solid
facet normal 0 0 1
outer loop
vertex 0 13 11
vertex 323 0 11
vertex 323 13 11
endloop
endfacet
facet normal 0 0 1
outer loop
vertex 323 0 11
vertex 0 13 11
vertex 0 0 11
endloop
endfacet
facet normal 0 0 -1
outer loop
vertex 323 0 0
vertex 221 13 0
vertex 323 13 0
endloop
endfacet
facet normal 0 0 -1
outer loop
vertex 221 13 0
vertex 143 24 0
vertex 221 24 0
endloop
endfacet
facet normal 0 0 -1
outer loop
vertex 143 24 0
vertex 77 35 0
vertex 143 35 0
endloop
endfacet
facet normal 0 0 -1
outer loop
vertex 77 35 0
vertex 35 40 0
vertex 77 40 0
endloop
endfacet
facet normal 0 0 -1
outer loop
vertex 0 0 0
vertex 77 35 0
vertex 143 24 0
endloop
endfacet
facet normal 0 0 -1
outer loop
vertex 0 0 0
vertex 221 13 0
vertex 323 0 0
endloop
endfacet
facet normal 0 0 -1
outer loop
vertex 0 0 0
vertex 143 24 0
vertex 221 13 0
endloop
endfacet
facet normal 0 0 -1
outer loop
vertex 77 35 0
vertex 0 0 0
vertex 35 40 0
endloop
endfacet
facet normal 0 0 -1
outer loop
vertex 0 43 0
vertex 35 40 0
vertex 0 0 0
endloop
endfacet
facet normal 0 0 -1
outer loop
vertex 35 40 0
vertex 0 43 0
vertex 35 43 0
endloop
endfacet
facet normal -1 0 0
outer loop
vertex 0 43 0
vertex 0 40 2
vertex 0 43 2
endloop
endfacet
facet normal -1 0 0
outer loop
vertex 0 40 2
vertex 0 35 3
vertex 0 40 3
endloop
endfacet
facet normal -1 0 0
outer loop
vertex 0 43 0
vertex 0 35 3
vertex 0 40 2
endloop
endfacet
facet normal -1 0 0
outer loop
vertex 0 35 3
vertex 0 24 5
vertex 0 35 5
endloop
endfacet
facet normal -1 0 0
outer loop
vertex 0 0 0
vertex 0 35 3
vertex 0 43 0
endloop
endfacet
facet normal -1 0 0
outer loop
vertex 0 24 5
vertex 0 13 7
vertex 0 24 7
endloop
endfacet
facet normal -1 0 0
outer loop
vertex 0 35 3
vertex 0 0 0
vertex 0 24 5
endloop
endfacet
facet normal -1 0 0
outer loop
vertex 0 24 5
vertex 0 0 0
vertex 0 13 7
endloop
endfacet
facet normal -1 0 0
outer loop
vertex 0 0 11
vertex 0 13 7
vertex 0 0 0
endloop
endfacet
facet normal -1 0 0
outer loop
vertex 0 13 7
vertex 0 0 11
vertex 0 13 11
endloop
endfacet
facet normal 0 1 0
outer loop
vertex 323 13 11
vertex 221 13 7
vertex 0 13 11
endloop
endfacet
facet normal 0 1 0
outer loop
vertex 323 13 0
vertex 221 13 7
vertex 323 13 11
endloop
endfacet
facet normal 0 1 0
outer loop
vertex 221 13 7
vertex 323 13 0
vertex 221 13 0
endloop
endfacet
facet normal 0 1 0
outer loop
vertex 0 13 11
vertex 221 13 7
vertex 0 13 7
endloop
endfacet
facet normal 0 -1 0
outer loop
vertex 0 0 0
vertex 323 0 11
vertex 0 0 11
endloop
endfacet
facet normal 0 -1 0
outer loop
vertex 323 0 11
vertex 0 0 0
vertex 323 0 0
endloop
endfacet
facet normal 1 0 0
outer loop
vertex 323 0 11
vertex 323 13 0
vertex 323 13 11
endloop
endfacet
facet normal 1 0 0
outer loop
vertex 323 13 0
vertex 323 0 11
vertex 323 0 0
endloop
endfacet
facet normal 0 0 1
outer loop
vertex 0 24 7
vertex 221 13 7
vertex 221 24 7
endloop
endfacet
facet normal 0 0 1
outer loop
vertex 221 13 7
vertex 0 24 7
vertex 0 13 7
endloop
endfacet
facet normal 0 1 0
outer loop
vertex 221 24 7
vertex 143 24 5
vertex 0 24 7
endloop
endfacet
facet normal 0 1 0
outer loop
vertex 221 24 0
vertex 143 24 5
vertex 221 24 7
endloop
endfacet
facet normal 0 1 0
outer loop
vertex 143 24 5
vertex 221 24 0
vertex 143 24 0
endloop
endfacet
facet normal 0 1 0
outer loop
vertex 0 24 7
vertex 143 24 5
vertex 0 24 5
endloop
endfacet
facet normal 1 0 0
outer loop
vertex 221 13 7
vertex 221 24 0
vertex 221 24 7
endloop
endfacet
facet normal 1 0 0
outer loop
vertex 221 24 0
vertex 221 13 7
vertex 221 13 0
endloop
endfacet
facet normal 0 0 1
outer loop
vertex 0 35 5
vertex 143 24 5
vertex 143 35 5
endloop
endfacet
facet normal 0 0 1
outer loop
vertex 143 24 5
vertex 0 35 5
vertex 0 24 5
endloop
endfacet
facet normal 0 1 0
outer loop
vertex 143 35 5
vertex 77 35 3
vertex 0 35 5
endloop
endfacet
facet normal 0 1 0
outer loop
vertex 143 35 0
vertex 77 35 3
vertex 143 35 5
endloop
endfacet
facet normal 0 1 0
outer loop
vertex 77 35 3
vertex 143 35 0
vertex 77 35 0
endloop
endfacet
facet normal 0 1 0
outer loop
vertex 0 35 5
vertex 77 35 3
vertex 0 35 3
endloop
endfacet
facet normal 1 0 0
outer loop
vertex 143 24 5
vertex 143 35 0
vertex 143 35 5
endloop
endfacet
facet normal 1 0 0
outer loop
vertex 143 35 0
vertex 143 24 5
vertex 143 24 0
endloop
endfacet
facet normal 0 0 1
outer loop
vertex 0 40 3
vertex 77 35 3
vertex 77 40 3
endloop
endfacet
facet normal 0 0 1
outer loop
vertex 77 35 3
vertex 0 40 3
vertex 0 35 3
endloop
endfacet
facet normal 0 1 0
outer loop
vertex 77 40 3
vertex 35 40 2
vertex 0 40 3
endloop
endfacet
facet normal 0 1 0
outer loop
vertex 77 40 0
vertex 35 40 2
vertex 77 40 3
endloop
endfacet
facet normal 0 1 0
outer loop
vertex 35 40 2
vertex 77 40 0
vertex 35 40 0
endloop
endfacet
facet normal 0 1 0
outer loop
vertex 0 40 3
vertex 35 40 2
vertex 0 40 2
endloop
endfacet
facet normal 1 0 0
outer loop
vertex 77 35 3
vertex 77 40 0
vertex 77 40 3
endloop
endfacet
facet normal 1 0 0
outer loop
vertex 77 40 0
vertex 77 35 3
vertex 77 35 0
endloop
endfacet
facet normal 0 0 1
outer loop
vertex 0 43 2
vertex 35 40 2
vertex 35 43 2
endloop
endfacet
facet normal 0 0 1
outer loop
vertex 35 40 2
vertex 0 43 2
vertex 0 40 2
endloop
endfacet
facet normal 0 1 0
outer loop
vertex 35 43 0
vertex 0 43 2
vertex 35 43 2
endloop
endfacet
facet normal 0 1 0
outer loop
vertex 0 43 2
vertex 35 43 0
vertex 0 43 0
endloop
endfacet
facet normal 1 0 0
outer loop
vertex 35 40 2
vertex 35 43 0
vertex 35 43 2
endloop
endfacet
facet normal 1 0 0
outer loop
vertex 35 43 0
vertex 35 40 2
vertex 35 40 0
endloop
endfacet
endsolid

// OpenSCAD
translate([8.5, 6.5, 5.5]) color([0.6315169232882821, 0.08649939658707362, 0.7550350740823142]) cube([17, 13, 11], center=true);
translate([25.5, 6.5, 5.5]) color([0.2947283238309857, 0.8301737658604361, 0.4490883769000732]) cube([17, 13, 11], center=true);
translate([42.5, 6.5, 5.5]) color([0.4620108455998946, 0.2187341846418389, 0.11445722556586746]) cube([17, 13, 11], center=true);
translate([59.5, 6.5, 5.5]) color([0.9788025142917065, 0.3011589686960586, 0.6091605287508749]) cube([17, 13, 11], center=true);
translate([76.5, 6.5, 5.5]) color([0.4242090709976407, 0.7513524999576429, 0.09255304692818778]) cube([17, 13, 11], center=true);
translate([93.5, 6.5, 5.5]) color([0.4976795968420046, 0.9609180855182016, 0.5437408220916614]) cube([17, 13, 11], center=true);
translate([110.5, 6.5, 5.5]) color([0.405305104554358, 0.6320656015278037, 0.0216193804206819]) cube([17, 13, 11], center=true);
translate([127.5, 6.5, 5.5]) color([0.2700784048715086, 0.6684886667173141, 0.0002532098932251925]) cube([17, 13, 11], center=true);
translate([144.5, 6.5, 5.5]) color([0.3984286079265319, 0.8905618085087551, 0.7099647178965433]) cube([17, 13, 11], center=true);
translate([161.5, 6.5, 5.5]) color([0.4445845492335537, 0.7465509493098265, 0.35382203223851694]) cube([17, 13, 11], center=true);
translate([178.5, 6.5, 5.5]) color([0.8712980207444939, 0.6725473918674463, 0.19603088941730495]) cube([17, 13, 11], center=true);
translate([195.5, 6.5, 5.5]) color([0.08525923665948931, 0.0704556688087915, 0.26248678792717994]) cube([17, 13, 11], center=true);
translate([212.5, 6.5, 5.5]) color([0.533638651221174, 0.11818482376773232, 0.8594532404023933]) cube([17, 13, 11], center=true);
translate([229.5, 6.5, 5.5]) color([0.8906989166138923, 0.7620005545284954, 0.06809296768032302]) cube([17, 13, 11], center=true);
translate([246.5, 6.5, 5.5]) color([0.8609410769469436, 0.2827478909480132, 0.13442052583382869]) cube([17, 13, 11], center=true);
translate([263.5, 6.5, 5.5]) color([0.5230599837537087, 0.21027834364306774, 0.10530639745894443]) cube([17, 13, 11], center=true);
translate([280.5, 6.5, 5.5]) color([0.9556548717215211, 0.5435731515542631, 0.7414270622920264]) cube([17, 13, 11], center=true);
translate([297.5, 6.5, 5.5]) color([0.9040457292510377, 0.2786145977098805, 0.4423646135017597]) cube([17, 13, 11], center=true);
translate([314.5, 6.5, 5.5]) color([0.5682329433322765, 0.13781274972163116, 0.1232982180791492]) cube([17, 13, 11], center=true);
translate([6.5, 18.5, 3.5]) color([0.12051785276403837, 0.4012165411640888, 0.4679428423906348]) cube([13, 11, 7], center=true);
translate([19.5, 18.5, 3.5]) color([0.5596131508667647, 0.29896126951320356, 0.6321114709426877]) cube([13, 11, 7], center=true);
translate([32.5, 18.5, 3.5]) color([0.7423454703026071, 0.21800995973285464, 0.48885816108208613]) cube([13, 11, 7], center=true);
translate([45.5, 18.5, 3.5]) color([0.501567157493831, 0.49271975198428686, 0.958422556968198]) cube([13, 11, 7], center=true);
translate([58.5, 18.5, 3.5]) color([0.44398175403613704, 0.14281143058247625, 0.4955231327742775]) cube([13, 11, 7], center=true);
translate([71.5, 18.5, 3.5]) color([0.8873352305676206, 0.21571394075115613, 0.3554013630116646]) cube([13, 11, 7], center=true);
translate([84.5, 18.5, 3.5]) color([0.39096604949642, 0.9928835035123682, 0.8462248334797323]) cube([13, 11, 7], center=true);
translate([97.5, 18.5, 3.5]) color([0.9789066021625461, 0.6868956228130294, 0.08137290691060206]) cube([13, 11, 7], center=true);
translate([110.5, 18.5, 3.5]) color([0.9493092651810784, 0.9246190463677613, 0.3951154575230438]) cube([13, 11, 7], center=true);
translate([123.5, 18.5, 3.5]) color([0.3612783181755085, 0.11615210489091876, 0.0037403702712440756]) cube([13, 11, 7], center=true);
translate([136.5, 18.5, 3.5]) color([0.2703277384724262, 0.6403732426441148, 0.29252642189785794]) cube([13, 11, 7], center=true);
translate([149.5, 18.5, 3.5]) color([0.9007258804640697, 0.14067978971908934, 0.5728503338092871]) cube([13, 11, 7], center=true);
translate([162.5, 18.5, 3.5]) color([0.1912043400515635, 0.43401891336511733, 0.7163457448050065]) cube([13, 11, 7], center=true);
translate([175.5, 18.5, 3.5]) color([0.3841301513333275, 0.33069552050314754, 0.6480049557775331]) cube([13, 11, 7], center=true);
translate([188.5, 18.5, 3.5]) color([0.6874717059379091, 0.14801928734251768, 0.93323205939552]) cube([13, 11, 7], center=true);
translate([201.5, 18.5, 3.5]) color([0.14750072005511716, 0.31607169754224296, 0.2088660889148145]) cube([13, 11, 7], center=true);
translate([214.5, 18.5, 3.5]) color([0.1868244368145192, 0.3491672112743387, 0.9834841816788549]) cube([13, 11, 7], center=true);
translate([5.5, 29.5, 2.5]) color([0.427290207198605, 0.49195852420878716, 0.7297831417632067]) cube([11, 11, 5], center=true);
translate([16.5, 29.5, 2.5]) color([0.7955834433152874, 0.43927203819181504, 0.2042687131951023]) cube([11, 11, 5], center=true);
translate([27.5, 29.5, 2.5]) color([0.709997013582239, 0.9058221085991531, 0.03327924187503195]) cube([11, 11, 5], center=true);
translate([38.5, 29.5, 2.5]) color([0.6331757983912308, 0.8710093735661795, 0.3636101637556439]) cube([11, 11, 5], center=true);
translate([49.5, 29.5, 2.5]) color([0.7431628081058981, 0.6774926049513658, 0.23306417175218364]) cube([11, 11, 5], center=true);
translate([60.5, 29.5, 2.5]) color([0.2975271762349214, 0.0866296567389645, 0.8688435220131177]) cube([11, 11, 5], center=true);
translate([71.5, 29.5, 2.5]) color([0.7514921149941085, 0.7714305883456576, 0.8829516943772963]) cube([11, 11, 5], center=true);
translate([82.5, 29.5, 2.5]) color([0.4114323292545551, 0.05394001775890156, 0.696805048854085]) cube([11, 11, 5], center=true);
translate([93.5, 29.5, 2.5]) color([0.6656296547984208, 0.6485122289860075, 0.5471816206705559]) cube([11, 11, 5], center=true);
translate([104.5, 29.5, 2.5]) color([0.7344166333532061, 0.4306045068871984, 0.45460236437769275]) cube([11, 11, 5], center=true);
translate([115.5, 29.5, 2.5]) color([0.25475221651879554, 0.47565246533915095, 0.3371942584654095]) cube([11, 11, 5], center=true);
translate([126.5, 29.5, 2.5]) color([0.04223511400675217, 0.05255331220371673, 0.34980223330761895]) cube([11, 11, 5], center=true);
translate([137.5, 29.5, 2.5]) color([0.2898096938030986, 0.007130057665757694, 0.06369015415518986]) cube([11, 11, 5], center=true);
translate([3.5, 37.5, 1.5]) color([0.42774457246440645, 0.22216650821772055, 0.6086379170158094]) cube([7, 5, 3], center=true);
translate([10.5, 37.5, 1.5]) color([0.557768500755667, 0.22097295115667703, 0.19284823789822858]) cube([7, 5, 3], center=true);
translate([17.5, 37.5, 1.5]) color([0.6083188139076446, 0.606354511401297, 0.08562053587131313]) cube([7, 5, 3], center=true);
translate([24.5, 37.5, 1.5]) color([0.31903016062772993, 0.53590115499306, 0.8934753784920533]) cube([7, 5, 3], center=true);
translate([31.5, 37.5, 1.5]) color([0.25549985489866966, 0.5219903070058861, 0.1901317713313112]) cube([7, 5, 3], center=true);
translate([38.5, 37.5, 1.5]) color([0.08011594570868696, 0.8699478397109702, 0.3457472114844995]) cube([7, 5, 3], center=true);
translate([45.5, 37.5, 1.5]) color([0.837290862214726, 0.25127706432840136, 0.7290260027021367]) cube([7, 5, 3], center=true);
translate([52.5, 37.5, 1.5]) color([0.3013213449137814, 0.5169005458056509, 0.38467176448284957]) cube([7, 5, 3], center=true);
translate([59.5, 37.5, 1.5]) color([0.4820846642847386, 0.8719757028853922, 0.2399620044566907]) cube([7, 5, 3], center=true);
translate([66.5, 37.5, 1.5]) color([0.3058147052987177, 0.5519737755681405, 0.009208459116004764]) cube([7, 5, 3], center=true);
translate([73.5, 37.5, 1.5]) color([0.4953005367860557, 0.43819859659275806, 0.9171481192782721]) cube([7, 5, 3], center=true);
translate([2.5, 41.5, 1.0]) color([0.41212019308576986, 0.49358197644734136, 0.44010860560926524]) cube([5, 3, 2], center=true);
translate([7.5, 41.5, 1.0]) color([0.0856157398333921, 0.2411443971002879, 0.8262650576639278]) cube([5, 3, 2], center=true);
translate([12.5, 41.5, 1.0]) color([0.15379567752788093, 0.8842528530898255, 0.2134665283608419]) cube([5, 3, 2], center=true);
translate([17.5, 41.5, 1.0]) color([0.6127566924478359, 0.818008657000479, 0.5590112191053322]) cube([5, 3, 2], center=true);
translate([22.5, 41.5, 1.0]) color([0.8866043301622452, 0.39447102725022787, 0.9589163376419946]) cube([5, 3, 2], center=true);
translate([27.5, 41.5, 1.0]) color([0.24972819156954773, 0.22005049979750413, 0.8404590105346786]) cube([5, 3, 2], center=true);
translate([32.5, 41.5, 1.0]) color([0.2789960200671917, 0.35210354864297055, 0.9946691500756418]) cube([5, 3, 2], center=true);
